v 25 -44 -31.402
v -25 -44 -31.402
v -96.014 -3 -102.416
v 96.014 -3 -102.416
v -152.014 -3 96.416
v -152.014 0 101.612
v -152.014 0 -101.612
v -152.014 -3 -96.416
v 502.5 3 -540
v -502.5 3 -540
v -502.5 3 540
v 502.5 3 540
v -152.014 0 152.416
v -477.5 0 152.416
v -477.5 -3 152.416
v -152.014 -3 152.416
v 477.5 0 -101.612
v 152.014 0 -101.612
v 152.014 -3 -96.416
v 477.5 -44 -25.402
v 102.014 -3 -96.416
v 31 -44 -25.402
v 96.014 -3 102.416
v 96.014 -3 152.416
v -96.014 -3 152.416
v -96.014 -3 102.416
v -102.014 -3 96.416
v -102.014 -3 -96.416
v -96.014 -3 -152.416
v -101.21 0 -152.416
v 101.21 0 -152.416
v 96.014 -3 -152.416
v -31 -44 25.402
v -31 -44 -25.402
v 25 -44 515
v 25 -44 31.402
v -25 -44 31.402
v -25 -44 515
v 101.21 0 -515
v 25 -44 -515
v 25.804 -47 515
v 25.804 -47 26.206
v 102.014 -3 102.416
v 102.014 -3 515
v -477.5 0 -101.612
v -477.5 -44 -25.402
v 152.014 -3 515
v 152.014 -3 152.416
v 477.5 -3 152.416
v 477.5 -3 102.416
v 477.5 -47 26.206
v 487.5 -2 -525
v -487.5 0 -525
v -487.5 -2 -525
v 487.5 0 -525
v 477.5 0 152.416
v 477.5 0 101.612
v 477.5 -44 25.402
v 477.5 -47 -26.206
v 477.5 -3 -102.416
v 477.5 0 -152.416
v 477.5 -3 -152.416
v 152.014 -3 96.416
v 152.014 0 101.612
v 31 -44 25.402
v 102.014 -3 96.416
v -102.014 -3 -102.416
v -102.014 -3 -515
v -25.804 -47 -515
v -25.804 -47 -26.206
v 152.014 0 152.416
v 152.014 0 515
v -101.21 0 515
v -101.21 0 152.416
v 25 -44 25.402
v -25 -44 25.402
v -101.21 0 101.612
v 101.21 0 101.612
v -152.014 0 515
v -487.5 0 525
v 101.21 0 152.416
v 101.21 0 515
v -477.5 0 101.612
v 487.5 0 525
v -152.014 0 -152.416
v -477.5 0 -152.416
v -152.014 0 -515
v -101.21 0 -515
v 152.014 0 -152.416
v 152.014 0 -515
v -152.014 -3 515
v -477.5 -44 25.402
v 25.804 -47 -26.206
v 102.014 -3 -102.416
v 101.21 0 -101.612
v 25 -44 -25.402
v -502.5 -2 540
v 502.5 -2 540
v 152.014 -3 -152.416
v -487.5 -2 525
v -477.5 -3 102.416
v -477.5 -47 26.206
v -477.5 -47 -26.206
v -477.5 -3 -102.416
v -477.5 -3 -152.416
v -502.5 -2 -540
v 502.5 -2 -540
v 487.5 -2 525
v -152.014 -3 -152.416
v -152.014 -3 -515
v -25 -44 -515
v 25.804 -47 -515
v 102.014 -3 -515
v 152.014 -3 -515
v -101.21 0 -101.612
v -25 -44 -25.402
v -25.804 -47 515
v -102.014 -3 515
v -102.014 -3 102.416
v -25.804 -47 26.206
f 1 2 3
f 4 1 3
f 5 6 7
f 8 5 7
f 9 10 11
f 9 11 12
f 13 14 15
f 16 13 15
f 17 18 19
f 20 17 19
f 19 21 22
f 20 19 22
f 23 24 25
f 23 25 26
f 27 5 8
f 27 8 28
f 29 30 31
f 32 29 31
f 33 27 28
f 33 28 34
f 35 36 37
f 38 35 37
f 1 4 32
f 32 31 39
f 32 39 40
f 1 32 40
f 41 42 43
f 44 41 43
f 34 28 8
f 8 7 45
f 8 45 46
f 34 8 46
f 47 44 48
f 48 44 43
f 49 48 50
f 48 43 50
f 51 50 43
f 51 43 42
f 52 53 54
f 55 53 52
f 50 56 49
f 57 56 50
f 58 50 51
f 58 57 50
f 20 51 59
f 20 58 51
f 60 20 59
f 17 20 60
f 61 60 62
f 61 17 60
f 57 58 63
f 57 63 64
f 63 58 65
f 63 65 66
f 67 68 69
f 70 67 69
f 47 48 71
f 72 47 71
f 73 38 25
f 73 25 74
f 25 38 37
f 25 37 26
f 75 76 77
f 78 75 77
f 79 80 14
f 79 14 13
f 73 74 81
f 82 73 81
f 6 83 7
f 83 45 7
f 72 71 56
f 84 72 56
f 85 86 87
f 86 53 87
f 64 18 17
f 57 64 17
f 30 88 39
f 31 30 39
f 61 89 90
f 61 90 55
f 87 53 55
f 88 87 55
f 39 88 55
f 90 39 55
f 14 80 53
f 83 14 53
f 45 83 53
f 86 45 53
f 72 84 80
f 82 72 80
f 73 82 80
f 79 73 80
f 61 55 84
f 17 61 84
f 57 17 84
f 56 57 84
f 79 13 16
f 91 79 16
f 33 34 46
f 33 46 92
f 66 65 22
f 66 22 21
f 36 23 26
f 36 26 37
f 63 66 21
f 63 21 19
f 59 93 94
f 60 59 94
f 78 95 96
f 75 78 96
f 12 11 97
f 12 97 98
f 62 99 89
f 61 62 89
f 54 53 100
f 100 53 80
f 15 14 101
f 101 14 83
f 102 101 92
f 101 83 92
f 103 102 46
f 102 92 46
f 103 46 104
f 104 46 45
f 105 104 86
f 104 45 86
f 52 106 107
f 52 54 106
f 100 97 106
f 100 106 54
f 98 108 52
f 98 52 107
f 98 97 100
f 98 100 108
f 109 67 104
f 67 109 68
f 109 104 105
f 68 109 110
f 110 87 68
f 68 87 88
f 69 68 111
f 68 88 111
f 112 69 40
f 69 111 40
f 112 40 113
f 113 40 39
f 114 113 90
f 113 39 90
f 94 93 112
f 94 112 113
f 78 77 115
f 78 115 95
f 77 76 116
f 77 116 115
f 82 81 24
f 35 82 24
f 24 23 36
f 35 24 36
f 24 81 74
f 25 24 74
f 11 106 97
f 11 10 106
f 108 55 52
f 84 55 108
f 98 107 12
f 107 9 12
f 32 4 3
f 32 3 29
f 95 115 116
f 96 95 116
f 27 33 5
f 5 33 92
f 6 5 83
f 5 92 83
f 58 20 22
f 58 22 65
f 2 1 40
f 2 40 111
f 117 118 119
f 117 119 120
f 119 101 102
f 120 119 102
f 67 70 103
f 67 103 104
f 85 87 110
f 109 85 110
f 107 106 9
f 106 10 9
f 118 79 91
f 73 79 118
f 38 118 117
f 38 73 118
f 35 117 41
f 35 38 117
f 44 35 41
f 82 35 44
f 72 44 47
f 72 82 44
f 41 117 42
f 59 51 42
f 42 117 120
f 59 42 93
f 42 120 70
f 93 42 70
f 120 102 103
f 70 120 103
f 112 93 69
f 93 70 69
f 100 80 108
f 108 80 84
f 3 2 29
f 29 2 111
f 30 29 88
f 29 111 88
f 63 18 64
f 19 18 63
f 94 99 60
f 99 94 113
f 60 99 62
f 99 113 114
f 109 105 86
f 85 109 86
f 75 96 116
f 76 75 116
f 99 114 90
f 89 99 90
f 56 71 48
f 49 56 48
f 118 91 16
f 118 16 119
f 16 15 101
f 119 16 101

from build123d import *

# Parameters (mm, degrees)
SKETCH_1_W           = 1005
SKETCH_1_H           = 1080
EXTRUDE_1_DEPTH      = 3
EXTRUDE_2_DEPTH      = 515
EXTRUDE_2_DEPTH_BACK = 515
EXTRUDE_3_DEPTH      = 477.5
EXTRUDE_3_DEPTH_BACK = 477.5
SKETCH_5_W           = 1005
SKETCH_5_H           = 1080
SKETCH_5_W_2         = 975
SKETCH_5_H_2         = 1050
EXTRUDE_5_DEPTH      = 2


with BuildPart() as part:
    # Эскиз1 → Бобышка-Вытянуть1 (new body)
    with BuildSketch(Plane(origin=(0, 0, 0), x_dir=(1, 0, 0), z_dir=(0, 1, 0))):
        Rectangle(SKETCH_1_W, SKETCH_1_H)
    extrude(amount=EXTRUDE_1_DEPTH)

    # Эскиз2 → Бобышка-Вытянуть2 (add, two sides: drawn at the far end of the back side and taken through both)
    with BuildSketch(Plane.XY.offset(-EXTRUDE_2_DEPTH_BACK)):
        Polygon((25, -44), (-25, -44), (-101.210235533, 0), (-152.01408311, 0), (-152.01408311, -3), (-102.01408311, -3), (-25.803847577, -47), (25.803847577, -47), (102.01408311, -3), (152.01408311, -3), (152.01408311, 0), (101.210235533, 0), align=None)
    extrude(amount=EXTRUDE_2_DEPTH + EXTRUDE_2_DEPTH_BACK)

    # Эскиз3 → Бобышка-Вытянуть3 (add, two sides: drawn at the far end of the back side and taken through both)
    with BuildSketch(Plane(origin=(0, 0, 0), x_dir=(0, 0, -1), z_dir=(1, 0, 0)).offset(-EXTRUDE_3_DEPTH_BACK)):
        Polygon((-26.205771366, -47), (26.205771366, -47), (102.416006899, -3), (152.416006899, -3), (152.416006899, 0), (101.612159322, 0), (25.401923789, -44), (-25.401923789, -44), (-101.612159322, 0), (-152.416006899, 0), (-152.416006899, -3), (-102.416006899, -3), align=None)
    extrude(amount=EXTRUDE_3_DEPTH + EXTRUDE_3_DEPTH_BACK)

    # Эскиз5 → Бобышка-Вытянуть5 (add)
    with BuildSketch(Plane.XZ):
        Rectangle(SKETCH_5_W, SKETCH_5_H)
        Rectangle(SKETCH_5_W_2, SKETCH_5_H_2, mode=Mode.SUBTRACT)
    extrude(amount=EXTRUDE_5_DEPTH)


solid = part.part
